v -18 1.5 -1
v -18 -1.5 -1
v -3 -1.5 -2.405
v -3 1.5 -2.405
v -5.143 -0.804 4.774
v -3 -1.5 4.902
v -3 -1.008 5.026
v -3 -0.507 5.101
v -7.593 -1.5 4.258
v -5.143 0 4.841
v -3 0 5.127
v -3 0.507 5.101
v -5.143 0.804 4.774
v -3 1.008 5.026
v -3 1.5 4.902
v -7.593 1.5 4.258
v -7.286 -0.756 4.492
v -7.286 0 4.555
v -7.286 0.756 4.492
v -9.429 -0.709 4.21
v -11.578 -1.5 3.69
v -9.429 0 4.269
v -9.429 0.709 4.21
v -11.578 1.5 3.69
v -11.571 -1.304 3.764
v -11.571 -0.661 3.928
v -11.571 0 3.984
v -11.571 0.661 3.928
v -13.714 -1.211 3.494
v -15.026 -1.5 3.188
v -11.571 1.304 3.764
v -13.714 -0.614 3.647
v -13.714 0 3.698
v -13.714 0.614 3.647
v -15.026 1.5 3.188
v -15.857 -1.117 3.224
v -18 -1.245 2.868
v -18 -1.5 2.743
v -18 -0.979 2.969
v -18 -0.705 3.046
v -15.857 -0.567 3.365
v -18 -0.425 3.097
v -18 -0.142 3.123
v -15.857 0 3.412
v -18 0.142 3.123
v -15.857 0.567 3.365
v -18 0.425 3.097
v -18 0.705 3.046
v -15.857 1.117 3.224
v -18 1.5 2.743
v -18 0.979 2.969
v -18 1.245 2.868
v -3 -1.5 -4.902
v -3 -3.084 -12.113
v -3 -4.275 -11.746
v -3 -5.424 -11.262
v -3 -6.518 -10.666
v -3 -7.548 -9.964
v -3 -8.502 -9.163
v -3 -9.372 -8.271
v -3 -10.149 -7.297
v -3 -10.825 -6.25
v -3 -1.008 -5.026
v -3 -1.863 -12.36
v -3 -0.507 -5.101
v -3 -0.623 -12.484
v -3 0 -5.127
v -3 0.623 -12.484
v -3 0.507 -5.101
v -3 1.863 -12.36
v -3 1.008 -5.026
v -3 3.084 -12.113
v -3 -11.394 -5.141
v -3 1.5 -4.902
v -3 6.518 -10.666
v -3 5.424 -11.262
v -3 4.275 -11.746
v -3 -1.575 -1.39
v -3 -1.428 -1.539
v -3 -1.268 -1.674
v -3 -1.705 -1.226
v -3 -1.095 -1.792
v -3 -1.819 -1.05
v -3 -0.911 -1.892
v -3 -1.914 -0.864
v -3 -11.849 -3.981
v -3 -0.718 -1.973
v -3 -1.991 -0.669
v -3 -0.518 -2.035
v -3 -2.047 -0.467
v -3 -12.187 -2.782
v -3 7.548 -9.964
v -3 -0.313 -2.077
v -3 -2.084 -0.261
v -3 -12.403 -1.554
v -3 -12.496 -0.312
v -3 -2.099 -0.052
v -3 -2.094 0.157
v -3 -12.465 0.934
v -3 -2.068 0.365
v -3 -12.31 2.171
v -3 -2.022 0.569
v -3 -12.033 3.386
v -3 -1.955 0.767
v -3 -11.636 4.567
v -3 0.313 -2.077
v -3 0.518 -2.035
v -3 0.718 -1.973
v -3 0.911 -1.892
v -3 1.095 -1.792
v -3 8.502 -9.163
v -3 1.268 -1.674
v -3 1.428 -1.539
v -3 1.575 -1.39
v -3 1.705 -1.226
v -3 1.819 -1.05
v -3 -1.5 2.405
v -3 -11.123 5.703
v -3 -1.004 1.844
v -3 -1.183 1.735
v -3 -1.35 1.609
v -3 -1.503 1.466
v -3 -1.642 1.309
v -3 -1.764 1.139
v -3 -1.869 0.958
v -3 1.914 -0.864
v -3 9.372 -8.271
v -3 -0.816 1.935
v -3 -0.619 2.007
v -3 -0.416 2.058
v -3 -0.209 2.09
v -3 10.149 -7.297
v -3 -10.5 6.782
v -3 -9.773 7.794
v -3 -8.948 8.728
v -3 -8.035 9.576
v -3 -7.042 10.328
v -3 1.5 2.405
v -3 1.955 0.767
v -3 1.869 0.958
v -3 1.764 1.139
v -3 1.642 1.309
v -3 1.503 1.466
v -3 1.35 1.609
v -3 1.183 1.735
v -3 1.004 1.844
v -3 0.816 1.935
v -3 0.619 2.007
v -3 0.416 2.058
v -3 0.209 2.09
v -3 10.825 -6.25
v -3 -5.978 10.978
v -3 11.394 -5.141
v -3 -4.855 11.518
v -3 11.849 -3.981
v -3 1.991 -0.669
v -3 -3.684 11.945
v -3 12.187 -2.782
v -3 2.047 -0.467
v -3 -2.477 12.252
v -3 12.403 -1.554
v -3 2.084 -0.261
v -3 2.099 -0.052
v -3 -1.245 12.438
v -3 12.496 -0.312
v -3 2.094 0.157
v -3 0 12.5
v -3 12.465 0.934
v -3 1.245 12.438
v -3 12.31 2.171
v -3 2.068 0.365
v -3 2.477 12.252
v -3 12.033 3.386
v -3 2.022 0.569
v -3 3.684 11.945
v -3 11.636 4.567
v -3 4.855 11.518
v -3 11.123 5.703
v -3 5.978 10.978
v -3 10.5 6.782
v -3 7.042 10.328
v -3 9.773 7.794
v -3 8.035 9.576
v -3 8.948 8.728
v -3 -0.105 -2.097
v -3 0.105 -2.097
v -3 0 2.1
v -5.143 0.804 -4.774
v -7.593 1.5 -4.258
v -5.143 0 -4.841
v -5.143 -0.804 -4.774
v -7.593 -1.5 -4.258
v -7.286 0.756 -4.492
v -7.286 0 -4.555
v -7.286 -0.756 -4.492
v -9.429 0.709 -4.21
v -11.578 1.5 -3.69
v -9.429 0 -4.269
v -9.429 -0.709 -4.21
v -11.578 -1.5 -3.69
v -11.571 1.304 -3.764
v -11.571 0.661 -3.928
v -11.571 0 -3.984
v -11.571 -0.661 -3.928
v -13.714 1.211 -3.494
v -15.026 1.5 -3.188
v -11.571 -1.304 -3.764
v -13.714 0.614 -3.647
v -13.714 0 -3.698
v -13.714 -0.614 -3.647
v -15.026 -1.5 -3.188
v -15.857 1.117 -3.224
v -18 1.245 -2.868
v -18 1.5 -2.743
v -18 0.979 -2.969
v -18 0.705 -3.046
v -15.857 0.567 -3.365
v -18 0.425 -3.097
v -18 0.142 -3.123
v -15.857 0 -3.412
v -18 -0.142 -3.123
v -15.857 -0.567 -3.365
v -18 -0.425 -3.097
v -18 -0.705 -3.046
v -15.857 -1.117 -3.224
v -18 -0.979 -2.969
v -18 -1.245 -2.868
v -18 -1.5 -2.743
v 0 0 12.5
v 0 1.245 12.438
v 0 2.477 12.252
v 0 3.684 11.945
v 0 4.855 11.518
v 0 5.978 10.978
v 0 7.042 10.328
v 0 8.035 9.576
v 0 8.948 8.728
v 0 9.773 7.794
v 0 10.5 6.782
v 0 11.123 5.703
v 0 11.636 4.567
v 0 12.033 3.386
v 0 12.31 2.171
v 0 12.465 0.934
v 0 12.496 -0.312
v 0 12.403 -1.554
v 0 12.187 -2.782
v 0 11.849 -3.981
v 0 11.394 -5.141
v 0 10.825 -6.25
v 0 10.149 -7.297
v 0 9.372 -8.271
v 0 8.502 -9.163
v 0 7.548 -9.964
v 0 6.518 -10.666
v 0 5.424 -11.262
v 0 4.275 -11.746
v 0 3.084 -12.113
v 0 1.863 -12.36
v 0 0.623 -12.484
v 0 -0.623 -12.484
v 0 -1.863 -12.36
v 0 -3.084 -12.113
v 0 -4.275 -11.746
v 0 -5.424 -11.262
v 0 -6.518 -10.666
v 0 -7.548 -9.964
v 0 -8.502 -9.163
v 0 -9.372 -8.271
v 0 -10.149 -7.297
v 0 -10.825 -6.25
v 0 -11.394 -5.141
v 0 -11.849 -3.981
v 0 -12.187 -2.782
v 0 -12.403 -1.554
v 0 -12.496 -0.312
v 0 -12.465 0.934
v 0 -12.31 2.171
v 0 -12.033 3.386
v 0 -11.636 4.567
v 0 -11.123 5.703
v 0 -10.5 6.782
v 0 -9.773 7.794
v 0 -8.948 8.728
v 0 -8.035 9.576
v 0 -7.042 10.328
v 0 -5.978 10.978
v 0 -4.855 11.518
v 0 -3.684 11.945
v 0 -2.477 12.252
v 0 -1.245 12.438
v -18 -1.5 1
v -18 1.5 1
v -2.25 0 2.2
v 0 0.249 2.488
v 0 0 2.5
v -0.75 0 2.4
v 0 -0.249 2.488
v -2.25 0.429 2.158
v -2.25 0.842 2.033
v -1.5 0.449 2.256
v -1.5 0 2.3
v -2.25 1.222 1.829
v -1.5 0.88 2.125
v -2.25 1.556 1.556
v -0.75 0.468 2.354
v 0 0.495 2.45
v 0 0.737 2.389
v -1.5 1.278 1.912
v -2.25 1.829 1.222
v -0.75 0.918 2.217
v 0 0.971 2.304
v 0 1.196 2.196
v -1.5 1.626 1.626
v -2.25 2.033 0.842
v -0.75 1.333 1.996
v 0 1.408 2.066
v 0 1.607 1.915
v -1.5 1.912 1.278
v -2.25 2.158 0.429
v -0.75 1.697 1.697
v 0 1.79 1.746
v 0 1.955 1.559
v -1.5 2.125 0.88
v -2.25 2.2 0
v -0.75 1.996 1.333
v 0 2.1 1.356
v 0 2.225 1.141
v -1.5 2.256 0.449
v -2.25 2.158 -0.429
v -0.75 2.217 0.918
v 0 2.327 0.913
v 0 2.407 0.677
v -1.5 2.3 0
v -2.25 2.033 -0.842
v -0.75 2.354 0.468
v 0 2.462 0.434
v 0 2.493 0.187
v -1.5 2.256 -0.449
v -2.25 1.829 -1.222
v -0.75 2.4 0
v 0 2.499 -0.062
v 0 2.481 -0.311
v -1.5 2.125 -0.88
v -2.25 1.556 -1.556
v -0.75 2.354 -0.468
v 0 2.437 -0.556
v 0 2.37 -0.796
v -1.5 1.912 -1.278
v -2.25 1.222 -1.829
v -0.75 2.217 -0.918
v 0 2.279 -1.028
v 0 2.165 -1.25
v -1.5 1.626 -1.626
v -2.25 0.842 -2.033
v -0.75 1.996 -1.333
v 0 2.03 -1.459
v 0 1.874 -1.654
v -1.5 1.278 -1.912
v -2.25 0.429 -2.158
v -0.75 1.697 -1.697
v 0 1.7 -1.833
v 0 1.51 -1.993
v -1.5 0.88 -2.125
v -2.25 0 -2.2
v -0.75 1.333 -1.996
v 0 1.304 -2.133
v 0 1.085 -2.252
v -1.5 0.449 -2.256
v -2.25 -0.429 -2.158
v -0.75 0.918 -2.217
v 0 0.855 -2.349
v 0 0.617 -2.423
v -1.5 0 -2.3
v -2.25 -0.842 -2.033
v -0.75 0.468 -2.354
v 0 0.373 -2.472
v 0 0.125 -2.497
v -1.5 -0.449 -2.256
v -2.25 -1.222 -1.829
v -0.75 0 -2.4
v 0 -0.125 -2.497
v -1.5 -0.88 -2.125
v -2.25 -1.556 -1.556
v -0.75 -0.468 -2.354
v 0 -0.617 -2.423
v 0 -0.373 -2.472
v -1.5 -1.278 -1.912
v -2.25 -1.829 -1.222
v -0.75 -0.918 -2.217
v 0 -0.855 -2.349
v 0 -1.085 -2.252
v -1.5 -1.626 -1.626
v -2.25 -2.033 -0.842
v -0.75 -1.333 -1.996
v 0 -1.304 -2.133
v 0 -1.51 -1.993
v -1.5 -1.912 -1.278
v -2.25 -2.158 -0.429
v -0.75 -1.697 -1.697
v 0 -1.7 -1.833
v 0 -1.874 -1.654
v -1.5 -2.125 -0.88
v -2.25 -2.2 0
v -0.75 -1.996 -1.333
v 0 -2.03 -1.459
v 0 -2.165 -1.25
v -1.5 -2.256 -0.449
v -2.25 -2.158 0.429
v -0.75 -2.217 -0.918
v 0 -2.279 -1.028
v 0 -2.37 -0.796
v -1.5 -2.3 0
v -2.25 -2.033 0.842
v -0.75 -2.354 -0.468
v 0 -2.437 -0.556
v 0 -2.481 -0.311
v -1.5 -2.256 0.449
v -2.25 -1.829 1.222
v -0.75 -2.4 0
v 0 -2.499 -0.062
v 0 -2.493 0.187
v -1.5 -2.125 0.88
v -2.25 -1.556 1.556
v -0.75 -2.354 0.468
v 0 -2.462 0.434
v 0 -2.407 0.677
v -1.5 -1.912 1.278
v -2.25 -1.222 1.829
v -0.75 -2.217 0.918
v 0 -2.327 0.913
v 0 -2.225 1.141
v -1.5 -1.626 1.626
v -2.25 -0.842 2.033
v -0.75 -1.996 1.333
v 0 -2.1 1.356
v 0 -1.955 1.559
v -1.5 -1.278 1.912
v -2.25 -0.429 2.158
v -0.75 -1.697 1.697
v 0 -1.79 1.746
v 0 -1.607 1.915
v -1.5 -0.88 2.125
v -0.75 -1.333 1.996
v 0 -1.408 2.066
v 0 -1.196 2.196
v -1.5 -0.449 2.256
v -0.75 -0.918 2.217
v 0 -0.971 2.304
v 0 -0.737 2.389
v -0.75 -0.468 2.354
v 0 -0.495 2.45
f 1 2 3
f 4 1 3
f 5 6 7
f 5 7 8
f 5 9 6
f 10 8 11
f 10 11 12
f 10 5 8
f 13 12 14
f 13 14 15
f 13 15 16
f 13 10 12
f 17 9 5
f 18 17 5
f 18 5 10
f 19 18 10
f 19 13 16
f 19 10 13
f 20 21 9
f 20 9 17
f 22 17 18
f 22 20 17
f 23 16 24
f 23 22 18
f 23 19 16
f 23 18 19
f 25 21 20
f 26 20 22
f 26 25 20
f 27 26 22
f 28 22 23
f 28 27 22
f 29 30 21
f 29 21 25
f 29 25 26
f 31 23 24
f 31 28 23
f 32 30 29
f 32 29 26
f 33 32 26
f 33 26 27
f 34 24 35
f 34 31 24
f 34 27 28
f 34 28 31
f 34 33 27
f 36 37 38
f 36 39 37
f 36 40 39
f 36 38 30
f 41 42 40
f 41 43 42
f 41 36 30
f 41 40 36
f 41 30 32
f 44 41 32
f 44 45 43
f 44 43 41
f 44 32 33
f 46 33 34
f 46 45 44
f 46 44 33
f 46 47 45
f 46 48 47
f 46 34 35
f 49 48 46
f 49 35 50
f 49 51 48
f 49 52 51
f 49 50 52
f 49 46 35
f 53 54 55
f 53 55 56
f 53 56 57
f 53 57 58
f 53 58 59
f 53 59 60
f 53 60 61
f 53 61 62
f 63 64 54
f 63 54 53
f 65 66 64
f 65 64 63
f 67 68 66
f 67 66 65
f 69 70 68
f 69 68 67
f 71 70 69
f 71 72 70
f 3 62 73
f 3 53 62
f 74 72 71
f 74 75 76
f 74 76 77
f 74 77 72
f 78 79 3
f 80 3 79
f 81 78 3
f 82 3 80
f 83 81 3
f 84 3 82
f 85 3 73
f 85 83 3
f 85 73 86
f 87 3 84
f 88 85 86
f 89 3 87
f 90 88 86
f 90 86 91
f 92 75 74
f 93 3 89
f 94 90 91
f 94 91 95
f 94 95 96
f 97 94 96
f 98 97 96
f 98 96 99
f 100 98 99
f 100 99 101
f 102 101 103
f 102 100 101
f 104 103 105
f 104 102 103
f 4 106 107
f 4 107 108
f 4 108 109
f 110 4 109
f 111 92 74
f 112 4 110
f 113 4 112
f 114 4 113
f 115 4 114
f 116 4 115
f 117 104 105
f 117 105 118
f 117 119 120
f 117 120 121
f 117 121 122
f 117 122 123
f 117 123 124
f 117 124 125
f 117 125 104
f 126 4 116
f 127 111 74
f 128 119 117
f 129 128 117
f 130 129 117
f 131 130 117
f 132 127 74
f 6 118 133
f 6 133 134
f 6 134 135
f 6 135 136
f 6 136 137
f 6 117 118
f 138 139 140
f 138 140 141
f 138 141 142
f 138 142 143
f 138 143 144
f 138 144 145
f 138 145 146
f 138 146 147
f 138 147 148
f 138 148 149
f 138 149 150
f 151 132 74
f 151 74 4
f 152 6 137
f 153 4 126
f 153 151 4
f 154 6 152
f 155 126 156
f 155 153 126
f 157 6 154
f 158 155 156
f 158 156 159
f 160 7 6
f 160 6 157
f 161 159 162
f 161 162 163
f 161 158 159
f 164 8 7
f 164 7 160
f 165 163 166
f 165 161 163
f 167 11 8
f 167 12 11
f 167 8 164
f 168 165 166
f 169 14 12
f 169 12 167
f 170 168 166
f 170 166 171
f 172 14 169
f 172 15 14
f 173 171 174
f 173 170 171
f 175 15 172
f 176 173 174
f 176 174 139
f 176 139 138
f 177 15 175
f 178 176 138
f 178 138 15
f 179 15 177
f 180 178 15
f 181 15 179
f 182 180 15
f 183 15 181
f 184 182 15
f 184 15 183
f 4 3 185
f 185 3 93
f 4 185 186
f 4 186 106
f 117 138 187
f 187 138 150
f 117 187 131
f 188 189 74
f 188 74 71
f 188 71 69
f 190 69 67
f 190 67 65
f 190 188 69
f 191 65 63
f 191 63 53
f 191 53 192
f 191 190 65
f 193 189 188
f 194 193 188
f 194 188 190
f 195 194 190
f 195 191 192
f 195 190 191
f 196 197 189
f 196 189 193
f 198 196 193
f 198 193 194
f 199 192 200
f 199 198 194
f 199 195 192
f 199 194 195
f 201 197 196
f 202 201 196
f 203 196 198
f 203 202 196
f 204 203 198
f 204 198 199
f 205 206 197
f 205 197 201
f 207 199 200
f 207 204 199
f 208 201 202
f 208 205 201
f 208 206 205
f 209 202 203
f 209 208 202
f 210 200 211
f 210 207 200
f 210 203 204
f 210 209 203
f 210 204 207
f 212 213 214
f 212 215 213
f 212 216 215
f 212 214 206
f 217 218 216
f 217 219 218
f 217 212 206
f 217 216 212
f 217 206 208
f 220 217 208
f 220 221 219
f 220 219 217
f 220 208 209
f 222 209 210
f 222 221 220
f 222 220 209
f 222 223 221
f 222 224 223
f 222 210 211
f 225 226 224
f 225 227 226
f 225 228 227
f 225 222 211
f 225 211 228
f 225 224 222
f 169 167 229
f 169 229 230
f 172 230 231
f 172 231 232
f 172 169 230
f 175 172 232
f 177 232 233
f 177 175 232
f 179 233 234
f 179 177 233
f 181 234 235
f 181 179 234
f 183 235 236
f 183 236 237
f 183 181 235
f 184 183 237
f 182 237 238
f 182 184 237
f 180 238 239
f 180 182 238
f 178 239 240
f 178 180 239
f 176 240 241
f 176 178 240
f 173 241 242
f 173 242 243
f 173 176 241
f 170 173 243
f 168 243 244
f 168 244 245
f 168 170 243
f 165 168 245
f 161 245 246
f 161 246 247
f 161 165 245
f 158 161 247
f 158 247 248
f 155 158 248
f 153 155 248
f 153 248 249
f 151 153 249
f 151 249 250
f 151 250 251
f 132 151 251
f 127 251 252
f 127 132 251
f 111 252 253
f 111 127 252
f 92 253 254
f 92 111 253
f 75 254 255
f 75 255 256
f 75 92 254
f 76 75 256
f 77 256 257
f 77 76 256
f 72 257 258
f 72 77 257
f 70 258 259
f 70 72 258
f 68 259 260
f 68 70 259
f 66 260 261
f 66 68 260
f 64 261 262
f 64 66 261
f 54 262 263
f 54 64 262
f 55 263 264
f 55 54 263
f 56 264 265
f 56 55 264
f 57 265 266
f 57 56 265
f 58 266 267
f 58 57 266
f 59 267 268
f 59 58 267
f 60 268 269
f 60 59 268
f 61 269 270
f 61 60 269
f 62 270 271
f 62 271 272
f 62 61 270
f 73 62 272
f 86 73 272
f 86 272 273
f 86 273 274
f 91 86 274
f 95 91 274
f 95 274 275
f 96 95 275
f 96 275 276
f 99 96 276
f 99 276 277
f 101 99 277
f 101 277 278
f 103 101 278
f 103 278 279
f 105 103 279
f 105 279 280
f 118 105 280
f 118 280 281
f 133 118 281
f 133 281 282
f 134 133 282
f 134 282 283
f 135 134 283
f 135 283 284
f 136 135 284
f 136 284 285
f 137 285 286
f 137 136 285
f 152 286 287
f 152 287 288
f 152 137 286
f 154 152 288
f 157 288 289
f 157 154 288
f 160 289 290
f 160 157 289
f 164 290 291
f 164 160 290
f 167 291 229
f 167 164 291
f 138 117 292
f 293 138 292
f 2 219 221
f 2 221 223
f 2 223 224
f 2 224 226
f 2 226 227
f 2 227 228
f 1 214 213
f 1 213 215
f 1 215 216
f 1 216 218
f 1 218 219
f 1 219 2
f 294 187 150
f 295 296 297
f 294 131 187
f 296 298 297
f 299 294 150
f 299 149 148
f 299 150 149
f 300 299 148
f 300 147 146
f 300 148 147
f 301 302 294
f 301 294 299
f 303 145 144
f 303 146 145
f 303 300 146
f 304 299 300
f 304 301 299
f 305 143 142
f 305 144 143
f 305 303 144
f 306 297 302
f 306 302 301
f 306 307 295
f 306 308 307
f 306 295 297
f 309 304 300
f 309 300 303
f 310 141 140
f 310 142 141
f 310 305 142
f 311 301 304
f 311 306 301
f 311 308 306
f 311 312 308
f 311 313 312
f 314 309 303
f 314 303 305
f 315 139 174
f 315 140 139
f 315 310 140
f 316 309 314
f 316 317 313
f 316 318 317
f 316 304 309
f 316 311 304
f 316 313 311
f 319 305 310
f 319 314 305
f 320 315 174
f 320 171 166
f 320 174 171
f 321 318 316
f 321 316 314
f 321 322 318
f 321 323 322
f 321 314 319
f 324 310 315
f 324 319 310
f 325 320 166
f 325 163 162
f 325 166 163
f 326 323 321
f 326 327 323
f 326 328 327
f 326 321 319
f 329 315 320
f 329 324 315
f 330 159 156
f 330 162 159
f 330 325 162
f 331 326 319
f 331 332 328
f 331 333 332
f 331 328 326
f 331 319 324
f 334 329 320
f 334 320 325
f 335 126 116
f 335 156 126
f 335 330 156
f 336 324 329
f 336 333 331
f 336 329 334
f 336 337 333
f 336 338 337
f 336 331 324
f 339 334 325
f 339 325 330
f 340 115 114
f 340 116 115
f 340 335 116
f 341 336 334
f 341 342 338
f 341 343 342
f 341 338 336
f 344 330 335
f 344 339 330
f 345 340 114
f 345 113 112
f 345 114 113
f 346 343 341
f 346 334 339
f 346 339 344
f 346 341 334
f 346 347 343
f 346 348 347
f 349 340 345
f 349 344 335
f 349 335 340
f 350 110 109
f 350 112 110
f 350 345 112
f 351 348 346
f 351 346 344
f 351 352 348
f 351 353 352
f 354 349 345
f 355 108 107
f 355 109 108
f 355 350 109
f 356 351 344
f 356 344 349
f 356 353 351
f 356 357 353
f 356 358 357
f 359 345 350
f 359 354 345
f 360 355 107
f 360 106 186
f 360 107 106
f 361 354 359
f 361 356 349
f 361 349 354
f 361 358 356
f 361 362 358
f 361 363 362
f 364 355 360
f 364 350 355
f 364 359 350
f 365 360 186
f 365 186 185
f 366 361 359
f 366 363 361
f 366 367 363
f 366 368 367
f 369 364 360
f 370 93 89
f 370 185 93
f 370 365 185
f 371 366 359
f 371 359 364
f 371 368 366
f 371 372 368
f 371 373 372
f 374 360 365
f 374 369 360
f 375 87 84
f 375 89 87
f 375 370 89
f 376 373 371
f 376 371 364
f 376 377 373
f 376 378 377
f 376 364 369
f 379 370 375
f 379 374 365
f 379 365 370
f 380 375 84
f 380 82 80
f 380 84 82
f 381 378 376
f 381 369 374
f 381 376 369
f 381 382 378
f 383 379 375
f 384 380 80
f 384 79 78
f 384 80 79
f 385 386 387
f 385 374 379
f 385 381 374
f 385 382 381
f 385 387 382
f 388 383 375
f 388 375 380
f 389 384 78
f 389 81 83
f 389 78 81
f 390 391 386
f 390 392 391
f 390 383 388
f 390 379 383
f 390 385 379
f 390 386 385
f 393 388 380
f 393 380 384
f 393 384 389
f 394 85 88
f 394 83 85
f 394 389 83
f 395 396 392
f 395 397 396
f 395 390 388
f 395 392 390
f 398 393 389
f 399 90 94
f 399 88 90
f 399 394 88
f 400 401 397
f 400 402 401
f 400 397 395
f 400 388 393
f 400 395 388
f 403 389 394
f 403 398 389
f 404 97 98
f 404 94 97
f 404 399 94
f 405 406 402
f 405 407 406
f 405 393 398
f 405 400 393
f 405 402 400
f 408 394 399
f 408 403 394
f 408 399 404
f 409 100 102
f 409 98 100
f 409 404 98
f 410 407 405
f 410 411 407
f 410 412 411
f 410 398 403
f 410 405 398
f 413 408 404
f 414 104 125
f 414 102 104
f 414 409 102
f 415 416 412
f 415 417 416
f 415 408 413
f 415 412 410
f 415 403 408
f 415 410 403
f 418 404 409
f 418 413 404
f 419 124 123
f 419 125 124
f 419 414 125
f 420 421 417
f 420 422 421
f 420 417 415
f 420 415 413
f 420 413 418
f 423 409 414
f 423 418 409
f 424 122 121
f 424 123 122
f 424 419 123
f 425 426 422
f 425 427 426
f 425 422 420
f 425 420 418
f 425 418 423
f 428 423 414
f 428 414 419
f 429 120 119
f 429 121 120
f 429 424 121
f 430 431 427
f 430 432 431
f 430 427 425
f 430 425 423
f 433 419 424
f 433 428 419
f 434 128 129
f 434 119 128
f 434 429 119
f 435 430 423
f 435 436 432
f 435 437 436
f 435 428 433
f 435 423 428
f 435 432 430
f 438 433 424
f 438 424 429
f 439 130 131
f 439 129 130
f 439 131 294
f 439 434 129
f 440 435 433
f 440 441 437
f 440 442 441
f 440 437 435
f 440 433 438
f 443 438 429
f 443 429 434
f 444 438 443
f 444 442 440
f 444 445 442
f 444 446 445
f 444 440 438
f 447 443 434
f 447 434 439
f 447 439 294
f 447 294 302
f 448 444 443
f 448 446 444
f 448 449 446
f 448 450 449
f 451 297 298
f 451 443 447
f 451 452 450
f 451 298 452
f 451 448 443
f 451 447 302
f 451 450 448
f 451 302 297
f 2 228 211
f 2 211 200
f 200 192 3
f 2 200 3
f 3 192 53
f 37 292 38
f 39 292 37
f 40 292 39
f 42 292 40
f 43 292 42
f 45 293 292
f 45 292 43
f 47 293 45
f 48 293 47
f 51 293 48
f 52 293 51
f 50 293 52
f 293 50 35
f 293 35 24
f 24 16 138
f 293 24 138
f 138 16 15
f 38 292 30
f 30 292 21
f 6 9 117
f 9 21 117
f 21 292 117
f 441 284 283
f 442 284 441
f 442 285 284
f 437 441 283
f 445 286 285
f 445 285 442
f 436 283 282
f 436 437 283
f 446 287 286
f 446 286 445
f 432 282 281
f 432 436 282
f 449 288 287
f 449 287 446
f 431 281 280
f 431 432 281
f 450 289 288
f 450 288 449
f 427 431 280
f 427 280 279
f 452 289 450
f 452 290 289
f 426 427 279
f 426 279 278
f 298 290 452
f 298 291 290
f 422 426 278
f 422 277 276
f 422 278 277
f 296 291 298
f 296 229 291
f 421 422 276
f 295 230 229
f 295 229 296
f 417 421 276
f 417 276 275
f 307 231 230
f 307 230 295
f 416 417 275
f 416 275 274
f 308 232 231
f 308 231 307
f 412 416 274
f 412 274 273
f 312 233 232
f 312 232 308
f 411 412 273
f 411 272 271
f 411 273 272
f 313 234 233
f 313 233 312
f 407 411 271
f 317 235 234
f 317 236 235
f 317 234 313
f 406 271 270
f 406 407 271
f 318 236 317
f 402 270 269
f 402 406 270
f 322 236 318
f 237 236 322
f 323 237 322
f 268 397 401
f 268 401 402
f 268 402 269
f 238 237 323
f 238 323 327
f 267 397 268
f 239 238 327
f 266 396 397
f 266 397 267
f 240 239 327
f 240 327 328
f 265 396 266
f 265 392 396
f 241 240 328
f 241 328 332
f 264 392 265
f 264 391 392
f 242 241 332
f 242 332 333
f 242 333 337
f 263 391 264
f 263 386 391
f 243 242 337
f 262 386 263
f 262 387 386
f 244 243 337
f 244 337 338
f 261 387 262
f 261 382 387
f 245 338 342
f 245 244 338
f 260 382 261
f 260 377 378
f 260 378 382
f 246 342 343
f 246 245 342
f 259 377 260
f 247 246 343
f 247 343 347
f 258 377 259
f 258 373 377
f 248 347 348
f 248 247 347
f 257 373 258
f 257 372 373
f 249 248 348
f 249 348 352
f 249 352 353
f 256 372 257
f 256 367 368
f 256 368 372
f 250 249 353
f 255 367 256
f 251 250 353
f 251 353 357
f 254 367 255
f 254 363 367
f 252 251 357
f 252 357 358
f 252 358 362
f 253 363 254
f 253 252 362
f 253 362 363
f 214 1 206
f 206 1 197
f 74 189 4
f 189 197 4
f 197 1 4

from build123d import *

# Parameters (mm, degrees)
F3_W     = 20
F3_H     = 4.5714285318
F4_DEPTH = 12.501
F5_DEPTH = 25
F7_DEPTH = 14.001


with BuildPart() as f2:
    # F0 (on Front) → F2 (revolve)
    with BuildSketch(Plane.XZ):
        Polygon((-18, 3.1265491901), (-18, 0.1), (0, 2.5), (0, 12.5), (-3, 12.5), (-3, 5.1265491901), align=None)
    revolve(axis=Axis((-8.8342446834, 0, 0), (-1, 0, 0)))

    # F3 (on Top) → F4 (cut, through all)
    with BuildSketch(Plane.XY):
        with Locations((-13, 3.7857142659)):
            Rectangle(F3_W, F3_H)
        with Locations((-13, -3.7857142659)):
            Rectangle(F3_W, F3_H)
    extrude(amount=F4_DEPTH, mode=Mode.SUBTRACT)

    # F3 (on Top) → F5 (cut)
    with BuildSketch(Plane.XY):
        with Locations((-13, 3.7857142659)):
            Rectangle(F3_W, F3_H)
        with Locations((-13, -3.7857142659)):
            Rectangle(F3_W, F3_H)
    extrude(amount=-F5_DEPTH, mode=Mode.SUBTRACT)

    # F6 (on face) → F7 (cut, through all)
    with BuildSketch(Plane.XZ.offset(1.5)):
        Polygon((-3, 0), (-3, 2.4047132604), (-18, 1), (-18, 0), (-18, -1), (-3, -2.4047132604), align=None)
    extrude(amount=-F7_DEPTH, mode=Mode.SUBTRACT)


solid = f2.part
